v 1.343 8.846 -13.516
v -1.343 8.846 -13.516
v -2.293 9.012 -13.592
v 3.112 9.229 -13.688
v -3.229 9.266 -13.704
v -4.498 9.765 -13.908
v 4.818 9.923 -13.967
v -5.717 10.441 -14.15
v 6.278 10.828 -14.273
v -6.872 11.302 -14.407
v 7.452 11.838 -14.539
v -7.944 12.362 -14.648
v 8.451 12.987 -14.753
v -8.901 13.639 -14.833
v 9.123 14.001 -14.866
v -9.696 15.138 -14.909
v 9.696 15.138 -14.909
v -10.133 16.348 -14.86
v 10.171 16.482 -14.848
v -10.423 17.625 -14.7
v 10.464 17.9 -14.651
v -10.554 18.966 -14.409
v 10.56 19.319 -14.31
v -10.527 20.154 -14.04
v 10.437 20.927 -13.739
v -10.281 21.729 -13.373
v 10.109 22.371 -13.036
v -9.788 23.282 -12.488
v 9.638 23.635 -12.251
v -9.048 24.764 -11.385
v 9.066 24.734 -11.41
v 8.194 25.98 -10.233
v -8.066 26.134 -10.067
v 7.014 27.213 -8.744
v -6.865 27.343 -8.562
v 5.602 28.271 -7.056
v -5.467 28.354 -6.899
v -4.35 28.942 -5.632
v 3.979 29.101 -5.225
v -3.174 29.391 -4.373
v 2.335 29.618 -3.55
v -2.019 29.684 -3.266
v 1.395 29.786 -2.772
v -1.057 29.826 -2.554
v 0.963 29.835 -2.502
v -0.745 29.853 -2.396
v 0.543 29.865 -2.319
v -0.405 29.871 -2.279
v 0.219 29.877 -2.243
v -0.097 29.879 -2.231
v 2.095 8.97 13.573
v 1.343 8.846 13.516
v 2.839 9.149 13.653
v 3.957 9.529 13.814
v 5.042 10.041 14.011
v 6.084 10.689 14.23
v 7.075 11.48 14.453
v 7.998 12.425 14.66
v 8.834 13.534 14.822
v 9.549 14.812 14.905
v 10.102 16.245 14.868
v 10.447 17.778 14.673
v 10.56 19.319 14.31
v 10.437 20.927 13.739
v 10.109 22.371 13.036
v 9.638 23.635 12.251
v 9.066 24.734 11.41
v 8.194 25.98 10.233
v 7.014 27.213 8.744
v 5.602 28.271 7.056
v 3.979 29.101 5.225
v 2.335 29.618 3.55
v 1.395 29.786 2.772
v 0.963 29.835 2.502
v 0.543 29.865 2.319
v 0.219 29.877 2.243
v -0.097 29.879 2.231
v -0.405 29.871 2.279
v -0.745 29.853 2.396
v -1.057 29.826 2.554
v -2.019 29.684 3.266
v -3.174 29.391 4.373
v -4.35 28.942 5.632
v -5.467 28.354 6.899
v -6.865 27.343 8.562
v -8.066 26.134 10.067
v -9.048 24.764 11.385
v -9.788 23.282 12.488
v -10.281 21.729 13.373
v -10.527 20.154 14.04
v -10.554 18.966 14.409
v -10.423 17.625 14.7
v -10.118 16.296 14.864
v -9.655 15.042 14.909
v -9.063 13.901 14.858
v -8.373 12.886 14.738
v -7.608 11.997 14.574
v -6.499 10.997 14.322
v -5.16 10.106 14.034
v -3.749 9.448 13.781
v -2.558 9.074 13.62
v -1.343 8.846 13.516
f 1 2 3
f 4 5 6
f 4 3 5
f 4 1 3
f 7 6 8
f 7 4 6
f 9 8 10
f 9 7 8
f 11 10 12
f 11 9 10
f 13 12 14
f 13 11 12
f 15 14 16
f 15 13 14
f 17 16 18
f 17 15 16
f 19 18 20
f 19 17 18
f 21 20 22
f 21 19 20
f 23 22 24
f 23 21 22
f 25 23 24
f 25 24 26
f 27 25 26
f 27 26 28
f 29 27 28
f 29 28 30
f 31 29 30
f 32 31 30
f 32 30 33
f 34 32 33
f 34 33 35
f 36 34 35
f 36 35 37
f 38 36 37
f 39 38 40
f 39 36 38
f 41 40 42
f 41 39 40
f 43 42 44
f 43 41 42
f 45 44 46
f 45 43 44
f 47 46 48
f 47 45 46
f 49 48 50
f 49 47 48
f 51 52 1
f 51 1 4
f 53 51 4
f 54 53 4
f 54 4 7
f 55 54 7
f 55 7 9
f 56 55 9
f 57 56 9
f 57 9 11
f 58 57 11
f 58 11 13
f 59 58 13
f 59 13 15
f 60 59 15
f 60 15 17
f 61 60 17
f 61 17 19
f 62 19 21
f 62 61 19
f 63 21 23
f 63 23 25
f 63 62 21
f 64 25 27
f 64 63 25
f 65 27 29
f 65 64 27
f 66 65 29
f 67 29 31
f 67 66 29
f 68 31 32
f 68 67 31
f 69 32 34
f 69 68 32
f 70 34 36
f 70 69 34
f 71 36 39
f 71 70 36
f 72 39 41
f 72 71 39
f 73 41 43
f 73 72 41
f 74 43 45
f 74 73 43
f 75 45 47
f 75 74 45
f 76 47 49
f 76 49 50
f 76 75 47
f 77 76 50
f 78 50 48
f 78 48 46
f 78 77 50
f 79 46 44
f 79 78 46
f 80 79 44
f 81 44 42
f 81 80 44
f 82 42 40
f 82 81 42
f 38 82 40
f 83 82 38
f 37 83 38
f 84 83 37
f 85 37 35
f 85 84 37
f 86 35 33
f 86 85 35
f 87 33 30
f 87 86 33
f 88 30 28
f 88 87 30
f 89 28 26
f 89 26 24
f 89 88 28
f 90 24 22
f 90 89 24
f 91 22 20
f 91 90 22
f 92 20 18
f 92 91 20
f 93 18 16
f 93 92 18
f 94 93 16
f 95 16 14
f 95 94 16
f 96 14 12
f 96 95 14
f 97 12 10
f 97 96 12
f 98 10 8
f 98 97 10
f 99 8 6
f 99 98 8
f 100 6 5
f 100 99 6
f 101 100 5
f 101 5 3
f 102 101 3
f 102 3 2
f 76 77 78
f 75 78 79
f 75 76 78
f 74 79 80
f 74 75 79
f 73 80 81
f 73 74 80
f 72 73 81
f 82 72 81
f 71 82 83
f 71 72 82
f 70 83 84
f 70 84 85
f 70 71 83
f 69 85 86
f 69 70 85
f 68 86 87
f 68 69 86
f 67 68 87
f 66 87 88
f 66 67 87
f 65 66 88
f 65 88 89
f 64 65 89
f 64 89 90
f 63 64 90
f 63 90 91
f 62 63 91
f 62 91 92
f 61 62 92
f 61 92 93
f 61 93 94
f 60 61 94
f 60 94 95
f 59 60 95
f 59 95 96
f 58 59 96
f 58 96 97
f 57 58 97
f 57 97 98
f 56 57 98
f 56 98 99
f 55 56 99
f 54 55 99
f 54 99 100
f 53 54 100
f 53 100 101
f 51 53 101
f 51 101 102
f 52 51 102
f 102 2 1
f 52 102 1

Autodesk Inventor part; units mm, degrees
ref_plane "YZ Plane" through (0, 0, 0) normal (1, 0, 0) x (0, 1, 0)
ref_plane "XZ Plane" through (0, 0, 0) normal (0, 1, 0) x (-1, 0, 0)
ref_plane "XY Plane" through (0, 0, 0) normal (0, 0, 1) x (1, 0, 0)
sketch "Sketch1" plane through (0, 0, 0) normal (0, 1, 0) x (-1, 0, 0)
  line L0 (15, -35) -> (-15, -35)
  line L1 (-15, -35) -> (-15, 35)
  line L2 (-15, 35) -> (15, 35)
  line L3 (15, 35) -> (15, -35)
  line L4 (15, -35) -> (-15, 35) construction
  line L5 (-15, -35) -> (15, 35) construction
  point P0 (0, 0)
  dimension "d0" = 30
  dimension "d1" = 70
extrude "Extrusion1" add sketch "Sketch1" along normal blind 30
sketch "Sketch2" plane through (15, 0, 35) normal (1, 0, 0) x (0, 0, -1)
  circle A0 centre (35, 15.1375) radius 14.909
  line L0 (0, 0) -> (0, 30) projected
  line L1 (0, 8.8455) -> (70, 8.8455)
  line L2 (0, 30) -> (70, 30) projected
  line L3 (0, 0) -> (70, 0) projected
  line L4 (70, 0) -> (70, 30) projected
  point P0 (35, 0)
  point P1 (36.1767, 30)
  point P2 (21.4837, 8.8455)
  point P3 (33.8233, 30)
  point P4 (48.5163, 8.8455)
extrude "Extrusion2" cut sketch "Sketch2" against normal blind 30 contours A0 L2 L4 L1 | A0 L1 L0 L2
sketch "Sketch3" plane through (-15, 0, 35) normal (0, 0, 1) x (1, 0, 0)
  circle A0 centre (15, 19.3194) radius 10.5597
  line L0 (0, 30) -> (0, 8.8455) projected
  line L1 (0, 30) -> (30, 30) projected
  line L2 (30, 8.8455) -> (30, 30) projected
  line L3 (30, 8.8455) -> (0, 8.8455) projected
  point P0 (15, 0)
  point P1 (13.6563, 8.8455)
  point P2 (16.3437, 8.8455)
extrude "Extrusion3" cut sketch "Sketch3" against normal blind 77 contours A0 L3 L0 L1 L2
sketch "Sketch5" plane through (15, 8.8455, 35) normal (0, 1, 0) x (1, 0, 0)
  line L0 (-30, 0) -> (0, 0) projected
  line L1 (-30, 70) -> (-30, 0) projected
  line L2 (0, 0) -> (-30, 0)
  line L3 (-30, 0) -> (-30, 70)
  line L4 (-30, 70) -> (0, 70)
  line L5 (0, 70) -> (0, 0)
  point P0 (-15, 35)
extrude "Extrusion5" cut sketch "Sketch5" against normal up to surface (8.8455 mm away)
sketch "Sketch6" plane through (15, 8.8455, 35) normal (0, -1, 0) x (1, 0, 0)
  line L0 (-13.6563, -48.5163) -> (-16.3437, -48.5163) projected
  line L1 (-15, -48.5163) -> (-15, -21.5593) construction
  line L2 (-13.6563, -21.4837) -> (-13.6563, -48.5163) projected
  line L3 (-13.6563, -35) -> (-16.3437, -35) construction
  point P0 (-15, -35)
  point P1 (-15, -35)
properties part number "ball transfer unit" material "Stainless Steel"
